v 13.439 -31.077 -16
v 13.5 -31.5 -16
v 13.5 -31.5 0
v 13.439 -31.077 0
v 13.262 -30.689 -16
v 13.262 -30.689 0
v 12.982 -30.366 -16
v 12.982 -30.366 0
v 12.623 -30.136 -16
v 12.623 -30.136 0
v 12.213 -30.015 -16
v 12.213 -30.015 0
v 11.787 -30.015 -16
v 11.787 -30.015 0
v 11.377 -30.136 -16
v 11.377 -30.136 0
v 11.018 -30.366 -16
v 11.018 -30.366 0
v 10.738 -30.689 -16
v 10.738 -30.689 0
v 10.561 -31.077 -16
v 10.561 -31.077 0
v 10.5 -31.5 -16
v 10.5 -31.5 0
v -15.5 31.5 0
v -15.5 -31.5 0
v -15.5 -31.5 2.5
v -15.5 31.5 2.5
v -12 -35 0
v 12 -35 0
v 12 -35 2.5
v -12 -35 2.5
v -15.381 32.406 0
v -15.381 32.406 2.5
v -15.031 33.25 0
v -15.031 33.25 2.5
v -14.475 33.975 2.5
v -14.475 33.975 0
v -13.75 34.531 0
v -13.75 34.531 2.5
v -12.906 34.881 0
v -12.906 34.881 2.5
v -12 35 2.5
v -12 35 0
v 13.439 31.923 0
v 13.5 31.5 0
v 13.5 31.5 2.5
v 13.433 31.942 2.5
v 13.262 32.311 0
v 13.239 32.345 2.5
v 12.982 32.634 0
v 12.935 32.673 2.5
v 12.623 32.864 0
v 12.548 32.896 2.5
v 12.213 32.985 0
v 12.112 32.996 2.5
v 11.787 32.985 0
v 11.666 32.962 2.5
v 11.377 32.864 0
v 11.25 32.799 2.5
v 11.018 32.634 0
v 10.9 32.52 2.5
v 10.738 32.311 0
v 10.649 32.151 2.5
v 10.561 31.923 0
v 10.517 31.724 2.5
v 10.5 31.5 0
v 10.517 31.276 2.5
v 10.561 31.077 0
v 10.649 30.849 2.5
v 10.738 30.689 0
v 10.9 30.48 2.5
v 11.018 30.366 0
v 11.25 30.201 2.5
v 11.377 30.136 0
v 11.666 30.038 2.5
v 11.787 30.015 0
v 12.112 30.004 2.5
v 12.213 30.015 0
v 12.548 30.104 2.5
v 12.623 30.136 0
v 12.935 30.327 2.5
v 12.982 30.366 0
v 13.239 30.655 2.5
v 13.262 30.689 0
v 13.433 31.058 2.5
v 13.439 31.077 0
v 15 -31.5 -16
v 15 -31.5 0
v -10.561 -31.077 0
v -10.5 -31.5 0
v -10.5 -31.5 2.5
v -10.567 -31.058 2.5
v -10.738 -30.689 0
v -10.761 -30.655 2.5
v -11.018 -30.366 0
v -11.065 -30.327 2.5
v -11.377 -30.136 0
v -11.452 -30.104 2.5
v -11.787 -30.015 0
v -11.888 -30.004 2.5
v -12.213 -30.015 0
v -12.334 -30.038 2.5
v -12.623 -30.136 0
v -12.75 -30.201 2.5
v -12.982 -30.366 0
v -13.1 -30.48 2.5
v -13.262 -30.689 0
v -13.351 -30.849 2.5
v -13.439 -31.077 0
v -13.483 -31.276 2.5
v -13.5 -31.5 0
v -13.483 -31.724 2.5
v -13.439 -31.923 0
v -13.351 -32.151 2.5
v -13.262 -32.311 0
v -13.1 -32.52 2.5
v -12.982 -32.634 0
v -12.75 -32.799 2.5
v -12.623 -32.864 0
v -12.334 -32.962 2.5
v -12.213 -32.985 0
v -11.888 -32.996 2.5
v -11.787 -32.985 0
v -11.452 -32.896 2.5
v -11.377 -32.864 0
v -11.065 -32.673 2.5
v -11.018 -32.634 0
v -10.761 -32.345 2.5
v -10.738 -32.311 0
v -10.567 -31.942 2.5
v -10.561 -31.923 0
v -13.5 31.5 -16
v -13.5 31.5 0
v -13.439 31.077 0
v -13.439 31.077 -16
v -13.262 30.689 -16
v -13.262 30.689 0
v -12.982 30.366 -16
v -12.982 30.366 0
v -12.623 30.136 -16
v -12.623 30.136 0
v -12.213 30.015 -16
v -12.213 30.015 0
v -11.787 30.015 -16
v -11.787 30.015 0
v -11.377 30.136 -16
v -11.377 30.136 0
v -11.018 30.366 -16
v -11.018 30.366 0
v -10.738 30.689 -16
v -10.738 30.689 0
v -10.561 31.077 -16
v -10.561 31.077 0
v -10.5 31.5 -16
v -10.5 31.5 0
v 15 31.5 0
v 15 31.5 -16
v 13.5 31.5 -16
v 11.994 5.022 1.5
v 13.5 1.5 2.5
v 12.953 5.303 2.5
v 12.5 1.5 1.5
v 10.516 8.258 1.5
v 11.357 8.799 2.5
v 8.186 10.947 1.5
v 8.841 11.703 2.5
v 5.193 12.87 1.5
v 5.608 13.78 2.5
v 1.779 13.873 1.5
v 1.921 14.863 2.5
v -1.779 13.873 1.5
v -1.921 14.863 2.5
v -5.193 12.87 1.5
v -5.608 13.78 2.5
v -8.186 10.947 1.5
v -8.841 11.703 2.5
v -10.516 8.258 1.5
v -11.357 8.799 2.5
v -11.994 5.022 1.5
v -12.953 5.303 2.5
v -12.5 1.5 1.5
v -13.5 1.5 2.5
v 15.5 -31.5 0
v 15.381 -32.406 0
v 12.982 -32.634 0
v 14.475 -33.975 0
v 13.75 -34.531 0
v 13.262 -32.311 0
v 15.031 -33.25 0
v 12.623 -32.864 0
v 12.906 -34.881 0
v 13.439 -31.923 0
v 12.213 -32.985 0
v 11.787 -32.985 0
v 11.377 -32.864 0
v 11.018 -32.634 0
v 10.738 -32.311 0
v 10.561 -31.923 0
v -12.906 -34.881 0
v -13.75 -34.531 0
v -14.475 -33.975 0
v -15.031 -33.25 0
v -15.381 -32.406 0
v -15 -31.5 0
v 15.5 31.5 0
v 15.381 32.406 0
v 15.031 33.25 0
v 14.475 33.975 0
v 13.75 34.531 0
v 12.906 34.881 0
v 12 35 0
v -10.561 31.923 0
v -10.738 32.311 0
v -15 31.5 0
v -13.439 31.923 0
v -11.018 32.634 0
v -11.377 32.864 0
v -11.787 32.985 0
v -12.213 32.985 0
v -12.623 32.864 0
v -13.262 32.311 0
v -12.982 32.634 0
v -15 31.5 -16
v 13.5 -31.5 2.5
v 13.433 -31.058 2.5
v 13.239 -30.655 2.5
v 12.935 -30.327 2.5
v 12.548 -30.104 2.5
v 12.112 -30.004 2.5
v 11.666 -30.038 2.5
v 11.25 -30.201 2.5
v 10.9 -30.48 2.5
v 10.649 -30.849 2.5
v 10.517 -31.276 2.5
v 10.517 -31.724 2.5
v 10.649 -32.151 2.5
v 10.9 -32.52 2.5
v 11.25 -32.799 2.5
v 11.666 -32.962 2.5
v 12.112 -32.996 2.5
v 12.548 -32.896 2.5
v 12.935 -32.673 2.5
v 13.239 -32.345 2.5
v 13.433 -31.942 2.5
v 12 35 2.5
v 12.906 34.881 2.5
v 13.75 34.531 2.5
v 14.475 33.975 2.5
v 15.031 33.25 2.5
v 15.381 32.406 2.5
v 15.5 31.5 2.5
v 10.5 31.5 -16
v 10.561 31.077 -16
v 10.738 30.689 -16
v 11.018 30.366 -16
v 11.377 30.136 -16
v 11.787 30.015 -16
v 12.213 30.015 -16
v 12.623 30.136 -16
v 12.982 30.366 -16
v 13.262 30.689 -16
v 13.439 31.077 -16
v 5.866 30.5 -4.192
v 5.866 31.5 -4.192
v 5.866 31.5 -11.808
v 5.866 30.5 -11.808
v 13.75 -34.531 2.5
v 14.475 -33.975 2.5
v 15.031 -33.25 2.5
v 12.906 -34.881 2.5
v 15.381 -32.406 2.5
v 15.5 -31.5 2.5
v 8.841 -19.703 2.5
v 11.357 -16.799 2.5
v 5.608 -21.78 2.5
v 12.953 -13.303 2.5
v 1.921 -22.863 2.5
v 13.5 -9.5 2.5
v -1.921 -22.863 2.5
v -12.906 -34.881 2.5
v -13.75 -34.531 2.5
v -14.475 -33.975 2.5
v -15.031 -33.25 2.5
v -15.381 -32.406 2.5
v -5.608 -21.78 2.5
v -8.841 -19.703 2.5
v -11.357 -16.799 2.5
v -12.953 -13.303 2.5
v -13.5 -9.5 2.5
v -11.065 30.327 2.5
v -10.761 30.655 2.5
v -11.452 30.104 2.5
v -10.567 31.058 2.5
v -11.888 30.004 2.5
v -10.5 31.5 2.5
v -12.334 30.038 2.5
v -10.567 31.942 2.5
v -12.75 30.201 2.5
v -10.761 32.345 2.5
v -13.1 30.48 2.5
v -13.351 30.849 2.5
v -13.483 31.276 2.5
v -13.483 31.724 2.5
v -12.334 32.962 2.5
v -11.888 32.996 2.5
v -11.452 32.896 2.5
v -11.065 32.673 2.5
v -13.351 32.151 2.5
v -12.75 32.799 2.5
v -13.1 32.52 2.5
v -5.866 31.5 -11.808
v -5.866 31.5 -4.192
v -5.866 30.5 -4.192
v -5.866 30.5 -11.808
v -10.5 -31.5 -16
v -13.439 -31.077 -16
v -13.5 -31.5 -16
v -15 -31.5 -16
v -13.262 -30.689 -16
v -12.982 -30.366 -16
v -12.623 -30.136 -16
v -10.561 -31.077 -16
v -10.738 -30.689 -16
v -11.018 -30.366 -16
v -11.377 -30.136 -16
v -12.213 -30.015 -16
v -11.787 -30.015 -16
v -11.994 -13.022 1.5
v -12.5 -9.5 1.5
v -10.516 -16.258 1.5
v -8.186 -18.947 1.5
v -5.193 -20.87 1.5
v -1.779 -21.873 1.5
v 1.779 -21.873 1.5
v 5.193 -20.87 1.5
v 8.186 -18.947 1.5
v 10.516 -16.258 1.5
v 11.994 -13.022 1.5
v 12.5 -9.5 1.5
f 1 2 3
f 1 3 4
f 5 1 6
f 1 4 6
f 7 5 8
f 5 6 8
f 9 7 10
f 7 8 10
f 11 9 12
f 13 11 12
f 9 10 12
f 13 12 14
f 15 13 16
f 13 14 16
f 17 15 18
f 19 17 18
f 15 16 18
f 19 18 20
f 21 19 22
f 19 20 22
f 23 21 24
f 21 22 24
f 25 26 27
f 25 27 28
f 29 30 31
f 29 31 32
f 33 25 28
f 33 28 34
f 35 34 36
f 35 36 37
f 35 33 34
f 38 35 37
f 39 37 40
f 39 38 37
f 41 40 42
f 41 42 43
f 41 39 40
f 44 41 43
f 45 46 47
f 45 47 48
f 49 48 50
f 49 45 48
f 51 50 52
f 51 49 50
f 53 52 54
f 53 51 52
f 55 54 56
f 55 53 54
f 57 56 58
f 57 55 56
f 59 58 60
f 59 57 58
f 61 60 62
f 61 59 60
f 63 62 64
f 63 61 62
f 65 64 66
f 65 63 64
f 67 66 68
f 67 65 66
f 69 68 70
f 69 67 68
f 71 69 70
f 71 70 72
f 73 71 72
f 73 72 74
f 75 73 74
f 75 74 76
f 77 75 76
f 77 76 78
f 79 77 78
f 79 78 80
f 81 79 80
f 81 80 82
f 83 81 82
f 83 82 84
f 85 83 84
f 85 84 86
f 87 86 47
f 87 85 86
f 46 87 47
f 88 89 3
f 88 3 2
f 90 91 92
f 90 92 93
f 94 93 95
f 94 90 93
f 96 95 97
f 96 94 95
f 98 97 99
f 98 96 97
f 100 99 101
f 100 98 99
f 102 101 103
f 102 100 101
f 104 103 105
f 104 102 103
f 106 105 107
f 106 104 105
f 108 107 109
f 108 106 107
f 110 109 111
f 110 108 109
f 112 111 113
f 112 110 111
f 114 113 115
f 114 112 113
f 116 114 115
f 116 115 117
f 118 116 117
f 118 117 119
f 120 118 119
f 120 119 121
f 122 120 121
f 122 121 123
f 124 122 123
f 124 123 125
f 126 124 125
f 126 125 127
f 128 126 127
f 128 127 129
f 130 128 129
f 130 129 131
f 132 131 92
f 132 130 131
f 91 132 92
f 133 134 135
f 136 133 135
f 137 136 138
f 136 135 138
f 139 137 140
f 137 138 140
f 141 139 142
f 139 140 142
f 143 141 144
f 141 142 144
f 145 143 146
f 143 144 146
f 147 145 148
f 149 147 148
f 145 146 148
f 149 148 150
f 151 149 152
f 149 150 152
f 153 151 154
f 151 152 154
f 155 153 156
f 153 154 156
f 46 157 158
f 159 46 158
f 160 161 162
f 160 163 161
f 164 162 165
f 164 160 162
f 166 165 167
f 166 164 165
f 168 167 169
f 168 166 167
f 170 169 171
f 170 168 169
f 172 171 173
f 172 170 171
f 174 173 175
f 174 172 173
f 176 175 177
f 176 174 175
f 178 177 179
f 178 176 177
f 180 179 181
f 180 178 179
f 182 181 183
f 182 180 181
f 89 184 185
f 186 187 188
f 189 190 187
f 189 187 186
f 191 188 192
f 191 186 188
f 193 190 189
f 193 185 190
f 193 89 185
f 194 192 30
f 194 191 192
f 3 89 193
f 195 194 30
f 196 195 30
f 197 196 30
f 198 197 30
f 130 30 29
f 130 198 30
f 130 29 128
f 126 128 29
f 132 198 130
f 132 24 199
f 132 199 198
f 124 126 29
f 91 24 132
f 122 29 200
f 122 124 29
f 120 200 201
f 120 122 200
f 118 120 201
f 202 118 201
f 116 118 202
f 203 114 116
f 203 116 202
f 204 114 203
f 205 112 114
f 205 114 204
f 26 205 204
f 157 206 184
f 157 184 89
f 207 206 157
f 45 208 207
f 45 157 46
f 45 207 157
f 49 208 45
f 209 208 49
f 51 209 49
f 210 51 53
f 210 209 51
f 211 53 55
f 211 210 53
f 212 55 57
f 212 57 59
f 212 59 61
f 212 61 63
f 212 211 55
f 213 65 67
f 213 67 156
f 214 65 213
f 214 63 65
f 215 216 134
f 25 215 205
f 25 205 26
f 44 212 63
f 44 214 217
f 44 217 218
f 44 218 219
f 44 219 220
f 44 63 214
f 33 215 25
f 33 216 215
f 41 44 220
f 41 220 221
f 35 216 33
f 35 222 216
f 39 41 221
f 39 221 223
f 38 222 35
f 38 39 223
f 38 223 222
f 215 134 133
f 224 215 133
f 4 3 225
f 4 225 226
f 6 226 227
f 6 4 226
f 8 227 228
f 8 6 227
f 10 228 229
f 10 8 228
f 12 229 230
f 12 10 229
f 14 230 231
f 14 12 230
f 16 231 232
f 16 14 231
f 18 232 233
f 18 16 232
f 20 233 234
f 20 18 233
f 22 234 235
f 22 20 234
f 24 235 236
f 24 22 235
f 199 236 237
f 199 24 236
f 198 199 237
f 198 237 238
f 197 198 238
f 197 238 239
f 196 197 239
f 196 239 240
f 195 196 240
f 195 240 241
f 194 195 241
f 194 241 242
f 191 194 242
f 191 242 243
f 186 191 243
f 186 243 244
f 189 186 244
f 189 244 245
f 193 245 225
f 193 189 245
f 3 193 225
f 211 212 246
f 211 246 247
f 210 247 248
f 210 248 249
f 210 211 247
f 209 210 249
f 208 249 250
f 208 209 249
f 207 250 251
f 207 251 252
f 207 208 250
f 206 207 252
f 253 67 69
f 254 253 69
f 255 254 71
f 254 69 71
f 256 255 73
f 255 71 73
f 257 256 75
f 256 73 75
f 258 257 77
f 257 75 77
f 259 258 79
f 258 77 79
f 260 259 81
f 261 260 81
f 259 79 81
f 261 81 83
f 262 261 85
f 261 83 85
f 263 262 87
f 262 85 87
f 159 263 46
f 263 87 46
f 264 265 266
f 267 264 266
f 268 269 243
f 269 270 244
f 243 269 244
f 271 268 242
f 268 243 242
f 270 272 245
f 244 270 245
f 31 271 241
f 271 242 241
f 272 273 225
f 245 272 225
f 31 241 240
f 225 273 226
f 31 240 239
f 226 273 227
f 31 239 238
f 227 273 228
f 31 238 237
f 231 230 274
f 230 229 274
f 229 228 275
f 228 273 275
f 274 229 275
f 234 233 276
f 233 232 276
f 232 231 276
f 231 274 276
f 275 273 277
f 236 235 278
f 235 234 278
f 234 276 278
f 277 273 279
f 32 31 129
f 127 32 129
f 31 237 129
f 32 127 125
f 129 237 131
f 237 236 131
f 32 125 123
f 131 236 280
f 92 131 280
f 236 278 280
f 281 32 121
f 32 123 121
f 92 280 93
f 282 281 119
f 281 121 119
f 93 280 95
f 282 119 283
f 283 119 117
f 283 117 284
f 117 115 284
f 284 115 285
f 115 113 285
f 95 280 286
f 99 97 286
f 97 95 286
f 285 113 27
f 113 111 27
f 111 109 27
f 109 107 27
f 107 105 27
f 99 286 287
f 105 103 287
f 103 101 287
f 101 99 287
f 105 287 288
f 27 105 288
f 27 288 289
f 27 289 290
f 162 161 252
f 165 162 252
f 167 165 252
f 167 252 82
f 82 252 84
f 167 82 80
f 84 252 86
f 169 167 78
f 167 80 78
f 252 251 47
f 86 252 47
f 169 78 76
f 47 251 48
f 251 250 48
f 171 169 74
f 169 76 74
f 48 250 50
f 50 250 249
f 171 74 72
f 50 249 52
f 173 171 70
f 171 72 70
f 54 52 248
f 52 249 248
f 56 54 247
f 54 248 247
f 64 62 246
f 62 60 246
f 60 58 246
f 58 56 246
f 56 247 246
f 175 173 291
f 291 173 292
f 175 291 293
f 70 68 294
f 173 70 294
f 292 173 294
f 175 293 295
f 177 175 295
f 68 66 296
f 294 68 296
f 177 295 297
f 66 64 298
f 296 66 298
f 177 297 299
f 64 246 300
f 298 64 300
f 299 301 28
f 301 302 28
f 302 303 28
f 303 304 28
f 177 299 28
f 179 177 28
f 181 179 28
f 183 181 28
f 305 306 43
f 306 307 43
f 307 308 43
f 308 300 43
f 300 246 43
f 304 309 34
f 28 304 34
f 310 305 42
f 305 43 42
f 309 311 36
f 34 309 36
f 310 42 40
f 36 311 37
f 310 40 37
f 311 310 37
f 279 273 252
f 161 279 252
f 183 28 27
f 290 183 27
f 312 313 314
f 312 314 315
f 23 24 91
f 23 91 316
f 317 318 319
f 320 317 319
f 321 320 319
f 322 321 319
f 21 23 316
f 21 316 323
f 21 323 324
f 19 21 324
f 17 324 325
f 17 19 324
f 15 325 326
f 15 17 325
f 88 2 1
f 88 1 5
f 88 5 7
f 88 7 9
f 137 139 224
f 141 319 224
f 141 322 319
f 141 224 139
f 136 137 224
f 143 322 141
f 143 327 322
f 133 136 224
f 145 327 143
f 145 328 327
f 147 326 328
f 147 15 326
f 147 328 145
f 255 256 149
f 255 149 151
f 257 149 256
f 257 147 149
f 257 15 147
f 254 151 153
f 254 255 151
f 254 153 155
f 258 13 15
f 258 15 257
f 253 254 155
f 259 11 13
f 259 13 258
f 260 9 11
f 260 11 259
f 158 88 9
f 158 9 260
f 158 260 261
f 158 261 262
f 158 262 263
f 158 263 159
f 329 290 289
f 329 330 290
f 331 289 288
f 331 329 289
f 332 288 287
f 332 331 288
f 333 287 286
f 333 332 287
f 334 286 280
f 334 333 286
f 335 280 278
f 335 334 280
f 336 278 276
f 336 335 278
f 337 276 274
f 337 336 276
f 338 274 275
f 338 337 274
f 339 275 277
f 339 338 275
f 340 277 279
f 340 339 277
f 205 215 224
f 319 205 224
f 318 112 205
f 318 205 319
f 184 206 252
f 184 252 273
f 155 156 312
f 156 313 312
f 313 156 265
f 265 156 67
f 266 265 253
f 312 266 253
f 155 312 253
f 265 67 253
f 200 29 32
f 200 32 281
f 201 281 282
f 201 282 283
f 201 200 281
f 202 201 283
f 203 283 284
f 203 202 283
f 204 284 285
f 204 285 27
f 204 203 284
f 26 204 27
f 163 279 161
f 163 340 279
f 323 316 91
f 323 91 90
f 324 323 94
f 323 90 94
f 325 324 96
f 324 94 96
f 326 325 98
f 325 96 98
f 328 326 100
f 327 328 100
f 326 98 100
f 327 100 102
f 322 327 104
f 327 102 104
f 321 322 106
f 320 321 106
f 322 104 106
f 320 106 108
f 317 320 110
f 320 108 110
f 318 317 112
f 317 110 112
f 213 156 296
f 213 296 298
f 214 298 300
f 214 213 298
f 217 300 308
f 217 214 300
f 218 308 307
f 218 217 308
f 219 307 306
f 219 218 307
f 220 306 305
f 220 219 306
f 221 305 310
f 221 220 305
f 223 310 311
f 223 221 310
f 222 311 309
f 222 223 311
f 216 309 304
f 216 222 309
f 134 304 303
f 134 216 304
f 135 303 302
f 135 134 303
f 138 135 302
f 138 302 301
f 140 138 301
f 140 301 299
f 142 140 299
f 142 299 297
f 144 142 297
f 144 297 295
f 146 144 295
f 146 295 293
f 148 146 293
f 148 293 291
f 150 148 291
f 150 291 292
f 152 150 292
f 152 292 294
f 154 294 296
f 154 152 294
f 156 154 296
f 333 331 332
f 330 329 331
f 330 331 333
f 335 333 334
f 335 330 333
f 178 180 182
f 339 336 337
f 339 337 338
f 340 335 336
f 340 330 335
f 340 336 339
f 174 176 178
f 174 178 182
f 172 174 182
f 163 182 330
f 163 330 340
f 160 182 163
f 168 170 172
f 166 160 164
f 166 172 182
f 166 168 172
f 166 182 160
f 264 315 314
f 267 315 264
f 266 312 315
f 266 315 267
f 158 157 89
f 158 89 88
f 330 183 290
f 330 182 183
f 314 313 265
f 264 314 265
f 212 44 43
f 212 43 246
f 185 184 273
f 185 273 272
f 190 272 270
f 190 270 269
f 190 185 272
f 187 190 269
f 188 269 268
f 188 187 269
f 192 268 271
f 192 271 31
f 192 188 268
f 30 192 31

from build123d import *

# Parameters (mm, degrees)
BOSS_EXTRUDE1_DEPTH     = 2.5
SKETCH3_W               = 16
SKETCH3_H               = 63
BOSS_EXTRUDE2_DEPTH     = 15
SKETCH2_R               = 1.5
CUT_EXTRUDE1_DEPTH      = 3.5
CUT_EXTRUDE1_DEPTH_BACK = 17
CUT_EXTRUDE2_DEPTH      = 1
CUT_EXTRUDE2_TAPER      = 45
SKETCH5_W               = 11.73250701
SKETCH5_H               = 7.616061756
CUT_EXTRUDE3_DEPTH      = 1


with BuildPart() as part:
    # Sketch1 → Boss-Extrude1 (new body)
    with BuildSketch(Plane.XY):
        with BuildLine():
            Line((-12, 35), (12, 35))
            ThreePointArc((12, 35), (14.474873734, 33.974873734), (15.5, 31.5))
            Line((15.5, 31.5), (15.5, -31.5))
            ThreePointArc((15.5, -31.5), (14.474873734, -33.974873734), (12, -35))
            Line((12, -35), (-12, -35))
            ThreePointArc((-12, -35), (-14.474873734, -33.974873734), (-15.5, -31.5))
            Line((-15.5, -31.5), (-15.5, 31.5))
            ThreePointArc((-15.5, 31.5), (-14.474873734, 33.974873734), (-12, 35))
        make_face()
    extrude(amount=BOSS_EXTRUDE1_DEPTH)

    # Sketch3 → Boss-Extrude2 (add, symmetric)
    with BuildSketch(Plane(origin=(0, 0, 0), x_dir=(0, 0, -1), z_dir=(1, 0, 0))):
        with Locations((8, 0)):
            Rectangle(SKETCH3_W, SKETCH3_H)
    extrude(amount=BOSS_EXTRUDE2_DEPTH, both=True)

    # Sketch2 → Cut-Extrude1 (cut, two sides)
    with BuildSketch(Plane.XY) as cut_extrude1_sk:
        with Locations((-12, -31.5)):
            Circle(SKETCH2_R)
        with Locations((12, -31.5)):
            Circle(SKETCH2_R)
        with Locations((12, 31.5)):
            Circle(SKETCH2_R)
        with Locations((-12, 31.5)):
            Circle(SKETCH2_R)
    extrude(amount=CUT_EXTRUDE1_DEPTH, mode=Mode.SUBTRACT)
    extrude(cut_extrude1_sk.sketch, amount=-CUT_EXTRUDE1_DEPTH_BACK, mode=Mode.SUBTRACT)

    # Sketch4 → Cut-Extrude2 (cut)
    with BuildSketch(Plane.XY.offset(2.5)):
        with BuildLine():
            ThreePointArc((13.5, 1.5), (0, 15), (-13.5, 1.5))
            Line((-13.5, 1.5), (-13.5, -9.5))
            ThreePointArc((-13.5, -9.5), (0, -23), (13.5, -9.5))
            Line((13.5, -9.5), (13.5, 1.5))
        make_face()
    extrude(amount=-CUT_EXTRUDE2_DEPTH, taper=CUT_EXTRUDE2_TAPER, mode=Mode.SUBTRACT)

    # Sketch5 → Cut-Extrude3 (cut)
    with BuildSketch(Plane(origin=(0, 31.5, 0), x_dir=(1, 0, 0), z_dir=(0, 1, 0))):
        with Locations((0, 8)):
            Rectangle(SKETCH5_W, SKETCH5_H)
    extrude(amount=-CUT_EXTRUDE3_DEPTH, mode=Mode.SUBTRACT)


solid = part.part
